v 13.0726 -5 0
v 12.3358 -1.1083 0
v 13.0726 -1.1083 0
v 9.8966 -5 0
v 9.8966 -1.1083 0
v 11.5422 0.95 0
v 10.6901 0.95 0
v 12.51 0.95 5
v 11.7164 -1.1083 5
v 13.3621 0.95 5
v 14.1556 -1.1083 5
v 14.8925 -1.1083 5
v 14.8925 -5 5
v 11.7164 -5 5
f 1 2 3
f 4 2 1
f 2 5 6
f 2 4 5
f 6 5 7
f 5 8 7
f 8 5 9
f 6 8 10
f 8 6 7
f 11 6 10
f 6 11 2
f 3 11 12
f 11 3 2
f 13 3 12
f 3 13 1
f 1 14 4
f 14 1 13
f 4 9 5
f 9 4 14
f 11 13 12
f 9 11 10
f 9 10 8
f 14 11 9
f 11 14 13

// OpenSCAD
/*
*******************************************
Objekt Info: Bibliothek für Zahnräder, 
             Schnecken und Zahnstangen

*******************************************
Version: 22.10.2026 khf
//****************************************

Enthält die Module
- zahnstange(modul, laenge, hoehe, breite, eingriffswinkel=20, schraegungswinkel=0)
- stirnrad(modul, zahnzahl, breite, bohrung, eingriffswinkel=20, schraegungswinkel=0, optimiert=true)
- pfeilrad(modul, zahnzahl, breite, bohrung, eingriffswinkel=20, schraegungswinkel=0, optimiert=true)
- zahnstange_und_rad (modul, laenge_stange, zahnzahl_rad, hoehe_stange, bohrung_rad, breite, eingriffswinkel=20, schraegungswinkel=0, zusammen_gebaut=true, optimiert=true)
- hohlrad(modul, zahnzahl, breite, randbreite, eingriffswinkel=20, schraegungswinkel=0)
- pfeilhohlrad(modul, zahnzahl, breite, randbreite, eingriffswinkel=20, schraegungswinkel=0)
- planetengetriebe(modul, zahnzahl_sonne, zahnzahl_planet, anzahl_planeten, breite, randbreite, bohrung, eingriffswinkel=20, schraegungswinkel=0, zusammen_gebaut=true, optimiert=true)
- kegelrad(modul, zahnzahl,  teilkegelwinkel, zahnbreite, bohrung, eingriffswinkel=20, schraegungswinkel=0)
- pfeilkegelrad(modul, zahnzahl, teilkegelwinkel, zahnbreite, bohrung, eingriffswinkel=20, schraegungswinkel=0)
- kegelradpaar(modul, zahnzahl_rad, zahnzahl_ritzel, achsenwinkel=90, zahnbreite, bohrung, eingriffswinkel = 20, schraegungswinkel=0, zusammen_gebaut=true)
- pfeilkegelradpaar(modul, zahnzahl_rad, zahnzsahl_ritzel, achsenwinkel=90, zahnbreite, bohrung, eingriffswinkel = 20, schraegungswinkel=0, zusammen_gebaut=true)
- schnecke(modul, gangzahl, laenge, bohrung, eingriffswinkel=20, steigungswinkel=10, zusammen_gebaut=true)
- schneckenradsatz(modul, zahnzahl, gangzahl, breite, laenge, bohrung_schnecke, bohrung_rad, eingriffswinkel=20, steigungswinkel=0, optimiert=true, zusammen_gebaut=true)


Erlaubte Module nach DIN 780:
0.05 0.06 0.08 0.10 0.12 0.16
0.20 0.25 0.3  0.4  0.5  0.6
0.7  0.8  0.9  1    1.25 1.5
2    2.5  3    4    5    6
8    10   12   16   20   25
32   40   50   60

*/
$fn = 96;

// Module:

 zahnstange(modul=1, laenge=40, hoehe=5, breite=5, eingriffswinkel=20, schraegungswinkel=20);

// stirnrad (modul=1, zahnzahl=30, breite=5, bohrung=4, eingriffswinkel=20, schraegungswinkel=20, optimiert=true);

// pfeilrad (modul=1, zahnzahl=30, breite=5, bohrung=4, eingriffswinkel=20, schraegungswinkel=30, optimiert=true);

// zahnstange_und_rad (modul=1, laenge_stange=50, zahnzahl_rad=30, hoehe_stange=4, bohrung_rad=4, breite=5, eingriffswinkel=20, schraegungswinkel=0, zusammen_gebaut=true, optimiert=true);

// hohlrad (modul=1, zahnzahl=30, breite=5, randbreite=3, eingriffswinkel=20, schraegungswinkel=20);

// pfeilhohlrad (modul=1, zahnzahl=30, breite=5, randbreite=3, eingriffswinkel=20, schraegungswinkel=30);

// planetengetriebe(modul=1, zahnzahl_sonne=16, zahnzahl_planet=9, anzahl_planeten=5, breite=5, randbreite=3, bohrung=4, eingriffswinkel=20, schraegungswinkel=30, zusammen_gebaut=true, optimiert=true);

// kegelrad(modul=1, zahnzahl=30,  teilkegelwinkel=45, zahnbreite=5, bohrung=4, eingriffswinkel=20, schraegungswinkel=20);

// pfeilkegelrad(modul=1, zahnzahl=30, teilkegelwinkel=45, zahnbreite=5, bohrung=4, eingriffswinkel=20, schraegungswinkel=30);

// kegelradpaar(modul=1, zahnzahl_rad=30, zahnzahl_ritzel=11, achsenwinkel=100, zahnbreite=5, bohrung=4, eingriffswinkel = 20, schraegungswinkel=20, zusammen_gebaut=true);

// kegelradpaar(modul=1, zahnzahl_rad=30, zahnzahl_ritzel=11, achsenwinkel=100, zahnbreite=5, bohrung_rad=3, bohrung_ritzel=3, eingriffswinkel=20, schraegungswinkel=20, zusammen_gebaut=true);

// pfeilkegelradpaar(modul=1, zahnzahl_rad=30, zahnzahl_ritzel=11, achsenwinkel=100, zahnbreite=5, bohrung_rad=3, bohrung_ritzel=3, eingriffswinkel = 20, schraegungswinkel=30, zusammen_gebaut=false);

// schnecke(modul=1, gangzahl=2, laenge=15, bohrung=4, eingriffswinkel=20, steigungswinkel=10, zusammen_gebaut=true);

// schneckenradsatz(modul=1, zahnzahl=30, gangzahl=2, breite=8, laenge=20, bohrung_schnecke=4, bohrung_rad=4, eingriffswinkel=20, steigungswinkel=10, optimiert=true, zusammen_gebaut=true);


// Allgemeine Variablen
pi = 3.14159;
rad = 57.29578;
spiel = 0.05;	// Spiel zwischen Zähnen

/*	Wandelt Radian in Grad um */
function grad(eingriffswinkel) = eingriffswinkel*rad;

/*	Wandelt Grad in Radian um */
function radian(eingriffswinkel) = eingriffswinkel/rad;

/*	Wandelt 2D-Polarkoordinaten in kartesische um
    Format: radius, phi; phi = Winkel zur x-Achse auf xy-Ebene */
function pol_zu_kart(polvect) = [
	polvect[0]*cos(polvect[1]),  
	polvect[0]*sin(polvect[1])
];

/*	Kreisevolventen-Funktion:
    Gibt die Polarkoordinaten einer Kreisevolvente aus
    r = Radius des Grundkreises
    rho = Abrollwinkel in Grad */
function ev(r,rho) = [
	r/cos(rho),
	grad(tan(rho)-radian(rho))
];

/*  Kugelevolventen-Funktion
    Gibt den Azimutwinkel einer Kugelevolvente aus
    theta0 = Polarwinkel des Kegels, an dessen Schnittkante zur Großkugel die Evolvente abrollt
    theta = Polarwinkel, für den der Azimutwinkel der Evolvente berechnet werden soll */
function kugelev(theta0,theta) = 1/sin(theta0)*acos(cos(theta)/cos(theta0))-acos(tan(theta0)/tan(theta));

/*  Wandelt Kugelkoordinaten in kartesische um
    Format: radius, theta, phi; theta = Winkel zu z-Achse, phi = Winkel zur x-Achse auf xy-Ebene */
function kugel_zu_kart(vect) = [
	vect[0]*sin(vect[1])*cos(vect[2]),  
	vect[0]*sin(vect[1])*sin(vect[2]),
	vect[0]*cos(vect[1])
];

/*	prüft, ob eine Zahl gerade ist
	= 1, wenn ja
	= 0, wenn die Zahl nicht gerade ist */
function istgerade(zahl) =
	(zahl == floor(zahl/2)*2) ? 1 : 0;

/*	größter gemeinsamer Teiler
	nach Euklidischem Algorithmus.
	Sortierung: a muss größer als b sein */
function ggt(a,b) = 
	a%b == 0 ? b : ggt(b,a%b);

/*	Polarfunktion mit polarwinkel und zwei variablen */
function spirale(a, r0, phi) =
	a*phi + r0; 

/*	Kopiert und dreht einen Körper */
module kopiere(vect, zahl, abstand, winkel){
	for(i = [0:zahl-1]){
		translate(v=vect*abstand*i)
			rotate(a=i*winkel, v = [0,0,1])
				children(0);
	}
}

/*  Zahnstange
    modul = Höhe des Zahnkopfes über der Wälzgeraden
    laenge = Länge der Zahnstange
    hoehe = Höhe der Zahnstange bis zur Wälzgeraden
    breite = Breite eines Zahns
    eingriffswinkel = Eingriffswinkel, Standardwert = 20° gemäß DIN 867. Sollte nicht größer als 45° sein.
    schraegungswinkel = Schrägungswinkel zur Zahnstangen-Querachse; 0° = Geradverzahnung */
module zahnstange(modul, laenge, hoehe, breite, eingriffswinkel = 20, schraegungswinkel = 0) {

	// Dimensions-Berechnungen
	modul=modul*(1-spiel);
	c = modul / 6;												// Kopfspiel
	mx = modul/cos(schraegungswinkel);							// Durch Schrägungswinkel verzerrtes modul in x-Richtung
	a = 2*mx*tan(eingriffswinkel)+c*tan(eingriffswinkel);		// Flankenbreite
	b = pi*mx/2-2*mx*tan(eingriffswinkel);						// Kopfbreite
	x = breite*tan(schraegungswinkel);							// Verschiebung der Oberseite in x-Richtung durch Schrägungswinkel
	nz = ceil((laenge+abs(2*x))/(pi*mx));						// Anzahl der Zähne
	
	translate([-pi*mx*(nz-1)/2-a-b/2,-modul,0]){
		intersection(){											// Erzeugt ein Prisma, das in eine Quadergeometrie eingepasst wird
			kopiere([1,0,0], nz, pi*mx, 0){
				polyhedron(
					points=[[0,-c,0], [a,2*modul,0], [a+b,2*modul,0], [2*a+b,-c,0], [pi*mx,-c,0], [pi*mx,modul-hoehe,0], [0,modul-hoehe,0],	// Unterseite
						[0+x,-c,breite], [a+x,2*modul,breite], [a+b+x,2*modul,breite], [2*a+b+x,-c,breite], [pi*mx+x,-c,breite], [pi*mx+x,modul-hoehe,breite], [0+x,modul-hoehe,breite]],	// Oberseite
					faces=[[6,5,4,3,2,1,0],						// Unterseite
						[1,8,7,0],
						[9,8,1,2],
						[10,9,2,3],
						[11,10,3,4],
						[12,11,4,5],
						[13,12,5,6],
						[7,13,6,0],
						[7,8,9,10,11,12,13],					// Oberseite
					]
				);
			};
			translate([abs(x),-hoehe+modul-0.5,-0.5]){
				cube([laenge,hoehe+modul+1,breite+1]);			// Quader, der das Volumen der Zahnstange umfasst
			}	
		};
	};	
}

/*  Stirnrad
    modul = Höhe des Zahnkopfes über dem Teilkreis
    zahnzahl = Anzahl der Radzähne
    breite = Zahnbreite
    bohrung = Durchmesser der Mittelbohrung
    eingriffswinkel = Eingriffswinkel, Standardwert = 20° gemäß DIN 867. Sollte nicht größer als 45° sein.
    schraegungswinkel = Schrägungswinkel zur Rotationsachse; 0° = Geradverzahnung
	optimiert = Löcher zur Material-/Gewichtsersparnis bzw. Oberflächenvergößerung erzeugen, wenn Geometrie erlaubt */
module stirnrad(modul, zahnzahl, breite, bohrung, eingriffswinkel = 20, schraegungswinkel = 0, optimiert = true) {

	// Dimensions-Berechnungen	
	d = modul * zahnzahl;											// Teilkreisdurchmesser
	r = d / 2;														// Teilkreisradius
	alpha_stirn = atan(tan(eingriffswinkel)/cos(schraegungswinkel));// Schrägungswinkel im Stirnschnitt
	db = d * cos(alpha_stirn);										// Grundkreisdurchmesser
	rb = db / 2;													// Grundkreisradius
	da = (modul <1)? d + modul * 2.2 : d + modul * 2;				// Kopfkreisdurchmesser nach DIN 58400 bzw. DIN 867
	ra = da / 2;													// Kopfkreisradius
	c =  (zahnzahl <3)? 0 : modul/6;								// Kopfspiel
	df = d - 2 * (modul + c);										// Fußkreisdurchmesser
	rf = df / 2;													// Fußkreisradius
	rho_ra = acos(rb/ra);											// maximaler Abrollwinkel;
																	// Evolvente beginnt auf Grundkreis und endet an Kopfkreis
	rho_r = acos(rb/r);												// Abrollwinkel am Teilkreis;
																	// Evolvente beginnt auf Grundkreis und endet an Kopfkreis
	phi_r = grad(tan(rho_r)-radian(rho_r));							// Winkel zum Punkt der Evolvente auf Teilkreis
	gamma = rad*breite/(r*tan(90-schraegungswinkel));				// Torsionswinkel für Extrusion
	schritt = rho_ra/16;											// Evolvente wird in 16 Stücke geteilt
	tau = 360/zahnzahl;												// Teilungswinkel
	
	r_loch = (2*rf - bohrung)/8;									// Radius der Löcher für Material-/Gewichtsersparnis
	rm = bohrung/2+2*r_loch;										// Abstand der Achsen der Löcher von der Hauptachse
	z_loch = floor(2*pi*rm/(3*r_loch));								// Anzahl der Löcher für Material-/Gewichtsersparnis
	
	optimiert = (optimiert && r >= breite*1.5 && d > 2*bohrung);	// ist Optimierung sinnvoll?

	// Zeichnung
	union(){
		rotate([0,0,-phi_r-90*(1-spiel)/zahnzahl]){						// Zahn auf x-Achse zentrieren;
																		// macht Ausrichtung mit anderen Rädern einfacher

			linear_extrude(height = breite, twist = gamma){
				difference(){
					union(){
						zahnbreite = (180*(1-spiel))/zahnzahl+2*phi_r;
						circle(rf);										// Fußkreis	
						for (rot = [0:tau:360]){
							rotate (rot){								// "Zahnzahl-mal" kopieren und drehen
								polygon(concat(							// Zahn
									[[0,0]],							// Zahnsegment beginnt und endet im Ursprung
									[for (rho = [0:schritt:rho_ra])		// von null Grad (Grundkreis)
																		// bis maximalen Evolventenwinkel (Kopfkreis)
										pol_zu_kart(ev(rb,rho))],		// Erste Evolventen-Flanke

									[pol_zu_kart(ev(rb,rho_ra))],		// Punkt der Evolvente auf Kopfkreis

									[for (rho = [rho_ra:-schritt:0])	// von maximalen Evolventenwinkel (Kopfkreis)
																		// bis null Grad (Grundkreis)
										pol_zu_kart([ev(rb,rho)[0], zahnbreite-ev(rb,rho)[1]])]
																		// Zweite Evolventen-Flanke
																		// (180*(1-spiel)) statt 180 Grad,
																		// um Spiel an den Flanken zu erlauben
									)
								);
							}
						}
					}			
					circle(r = rm+r_loch*1.49);							// "Bohrung"
				}
			}
		}
		// mit Materialersparnis
		if (optimiert) {
			linear_extrude(height = breite){
				difference(){
						circle(r = (bohrung+r_loch)/2);
						circle(r = bohrung/2);							// Bohrung
					}
				}
			linear_extrude(height = (breite-r_loch/2 < breite*2/3) ? breite*2/3 : breite-r_loch/2){
				difference(){
					circle(r=rm+r_loch*1.51);
					union(){
						circle(r=(bohrung+r_loch)/2);
						for (i = [0:1:z_loch]){
							translate(kugel_zu_kart([rm,90,i*360/z_loch]))
								circle(r = r_loch);
						}
					}
				}
			}
		}
		// ohne Materialersparnis
		else {
			linear_extrude(height = breite){
				difference(){
					circle(r = rm+r_loch*1.51);
					circle(r = bohrung/2);
				}
			}
		}
	}
}

/*  Pfeilrad; verwendet das Modul "stirnrad"
    modul = Höhe des Zahnkopfes über dem Teilkreis
    zahnzahl = Anzahl der Radzähne
    breite = Zahnbreite
    bohrung = Durchmesser der Mittelbohrung
    eingriffswinkel = Eingriffswinkel, Standardwert = 20° gemäß DIN 867. Sollte nicht größer als 45° sein.
    schraegungswinkel = Schrägungswinkel zur Rotationsachse, Standardwert = 0° (Geradverzahnung)
	optimiert = Löcher zur Material-/Gewichtsersparnis */
module pfeilrad(modul, zahnzahl, breite, bohrung, eingriffswinkel = 20, schraegungswinkel=0, optimiert=true){

	breite = breite/2;
	d = modul * zahnzahl;											// Teilkreisdurchmesser
	r = d / 2;														// Teilkreisradius
	c =  (zahnzahl <3)? 0 : modul/6;								// Kopfspiel

	df = d - 2 * (modul + c);										// Fußkreisdurchmesser
	rf = df / 2;													// Fußkreisradius

	r_loch = (2*rf - bohrung)/8;									// Radius der Löcher für Material-/Gewichtsersparnis
	rm = bohrung/2+2*r_loch;										// Abstand der Achsen der Löcher von der Hauptachse
	z_loch = floor(2*pi*rm/(3*r_loch));								// Anzahl der Löcher für Material-/Gewichtsersparnis
	
	optimiert = (optimiert && r >= breite*3 && d > 2*bohrung);		// ist Optimierung sinnvoll?

	translate([0,0,breite]){
		union(){
			stirnrad(modul, zahnzahl, breite, 2*(rm+r_loch*1.49), eingriffswinkel, schraegungswinkel, false);		// untere Hälfte
			mirror([0,0,1]){
				stirnrad(modul, zahnzahl, breite, 2*(rm+r_loch*1.49), eingriffswinkel, schraegungswinkel, false);	// obere Hälfte
			}
		}
	}
	// mit Materialersparnis
	if (optimiert) {
		linear_extrude(height = breite*2){
			difference(){
					circle(r = (bohrung+r_loch)/2);
					circle(r = bohrung/2);							// Bohrung
				}
			}
		linear_extrude(height = (2*breite-r_loch/2 < 1.33*breite) ? 1.33*breite : 2*breite-r_loch/2){ //breite*4/3
			difference(){
				circle(r=rm+r_loch*1.51);
				union(){
					circle(r=(bohrung+r_loch)/2);
					for (i = [0:1:z_loch]){
						translate(kugel_zu_kart([rm,90,i*360/z_loch]))
							circle(r = r_loch);
					}
				}
			}
		}
	}
	// ohne Materialersparnis
	else {
		linear_extrude(height = breite*2){
			difference(){
				circle(r = rm+r_loch*1.51);
				circle(r = bohrung/2);
			}
		}
	}
}

/*	Zahnstange und -Rad
    modul = Höhe des Zahnkopfes über dem Teilkreis
    laenge_stange = Laenge der Zahnstange
    zahnzahl_rad = Anzahl der Radzähne
	hoehe_stange = Höhe der Zahnstange bis zur Wälzgeraden
    bohrung_rad = Durchmesser der Mittelbohrung des Stirnrads
	breite = Breite eines Zahns
    eingriffswinkel = Eingriffswinkel, Standardwert = 20° gemäß DIN 867. Sollte nicht größer als 45° sein.
    schraegungswinkel = Schrägungswinkel zur Rotationsachse, Standardwert = 0° (Geradverzahnung) */
module zahnstange_und_rad (modul, laenge_stange, zahnzahl_rad, hoehe_stange, bohrung_rad, breite, eingriffswinkel=20, schraegungswinkel=0, zusammen_gebaut=true, optimiert=true) {

	abstand = zusammen_gebaut? modul*zahnzahl_rad/2 : modul*zahnzahl_rad;

	zahnstange(modul, laenge_stange, hoehe_stange, breite, eingriffswinkel, -schraegungswinkel);
	translate([0,abstand,0])
		rotate(a=360/zahnzahl_rad)
			stirnrad (modul, zahnzahl_rad, breite, bohrung_rad, eingriffswinkel, schraegungswinkel, optimiert);
}

/*	Hohlrad
    modul = Höhe des Zahnkopfes über dem Teilkreis
    zahnzahl = Anzahl der Radzähne
    breite = Zahnbreite
	randbreite = Breite des Randes ab Fußkreis
    bohrung = Durchmesser der Mittelbohrung
    eingriffswinkel = Eingriffswinkel, Standardwert = 20° gemäß DIN 867. Sollte nicht größer als 45° sein.
    schraegungswinkel = Schrägungswinkel zur Rotationsachse, Standardwert = 0° (Geradverzahnung) */
module hohlrad(modul, zahnzahl, breite, randbreite, eingriffswinkel = 20, schraegungswinkel = 0) {

	// Dimensions-Berechnungen	
	ha = (zahnzahl >= 20) ? 0.02 * atan((zahnzahl/15)/pi) : 0.6;	// Verkürzungsfaktor Zahnkopfhöhe
	d = modul * zahnzahl;											// Teilkreisdurchmesser
	r = d / 2;														// Teilkreisradius
	alpha_stirn = atan(tan(eingriffswinkel)/cos(schraegungswinkel));// Schrägungswinkel im Stirnschnitt
	db = d * cos(alpha_stirn);										// Grundkreisdurchmesser
	rb = db / 2;													// Grundkreisradius
	c = modul / 6;													// Kopfspiel
	da = (modul <1)? d + (modul+c) * 2.2 : d + (modul+c) * 2;		// Kopfkreisdurchmesser
	ra = da / 2;													// Kopfkreisradius
	df = d - 2 * modul * ha;										// Fußkreisdurchmesser
	rf = df / 2;													// Fußkreisradius
	rho_ra = acos(rb/ra);											// maximaler Evolventenwinkel;
																	// Evolvente beginnt auf Grundkreis und endet an Kopfkreis
	rho_r = acos(rb/r);												// Evolventenwinkel am Teilkreis;
																	// Evolvente beginnt auf Grundkreis und endet an Kopfkreis
	phi_r = grad(tan(rho_r)-radian(rho_r));							// Winkel zum Punkt der Evolvente auf Teilkreis
	gamma = rad*breite/(r*tan(90-schraegungswinkel));				// Torsionswinkel für Extrusion
	schritt = rho_ra/16;											// Evolvente wird in 16 Stücke geteilt
	tau = 360/zahnzahl;												// Teilungswinkel

	// Zeichnung
	rotate([0,0,-phi_r-90*(1+spiel)/zahnzahl])						// Zahn auf x-Achse zentrieren;
																	// macht Ausrichtung mit anderen Rädern einfacher
	linear_extrude(height = breite, twist = gamma){
		difference(){
			circle(r = ra + randbreite);							// Außenkreis
			union(){
				zahnbreite = (180*(1+spiel))/zahnzahl+2*phi_r;
				circle(rf);											// Fußkreis	
				for (rot = [0:tau:360]){
					rotate (rot) {									// "Zahnzahl-mal" kopieren und drehen
						polygon( concat(
							[[0,0]],
							[for (rho = [0:schritt:rho_ra])			// von null Grad (Grundkreis)
																	// bis maximaler Evolventenwinkel (Kopfkreis)
								pol_zu_kart(ev(rb,rho))],
							[pol_zu_kart(ev(rb,rho_ra))],
							[for (rho = [rho_ra:-schritt:0])		// von maximaler Evolventenwinkel (Kopfkreis)
																	// bis null Grad (Grundkreis)
								pol_zu_kart([ev(rb,rho)[0], zahnbreite-ev(rb,rho)[1]])]
																	// (180*(1+spiel)) statt 180,
																	// um Spiel an den Flanken zu erlauben
							)
						);
					}
				}
			}
		}
	}

	echo("Außendurchmesser Hohlrad = ", 2*(ra + randbreite));
	
}

/*  Pfeil-Hohlrad; verwendet das Modul "hohlrad"
    modul = Höhe des Zahnkopfes über dem Teilkegel
    zahnzahl = Anzahl der Radzähne
    breite = Zahnbreite
    bohrung = Durchmesser der Mittelbohrung
    eingriffswinkel = Eingriffswinkel, Standardwert = 20° gemäß DIN 867. Sollte nicht größer als 45° sein.
    schraegungswinkel = Schrägungswinkel zur Rotationsachse, Standardwert = 0° (Geradverzahnung) */
module pfeilhohlrad(modul, zahnzahl, breite, randbreite, eingriffswinkel = 20, schraegungswinkel = 0) {

	breite = breite / 2;
	translate([0,0,breite])
		union(){
		hohlrad(modul, zahnzahl, breite, randbreite, eingriffswinkel, schraegungswinkel);		// untere Hälfte
		mirror([0,0,1])
			hohlrad(modul, zahnzahl, breite, randbreite, eingriffswinkel, schraegungswinkel);	// obere Hälfte
	}
}

/*	Planetengetriebe; verwendet die Module "pfeilrad" und "pfeilhohlrad"
    modul = Höhe des Zahnkopfes über dem Teilkegel
    zahnzahl_sonne = Anzahl der Zähne des Sonnenrads
    zahnzahl_planet = Anzahl der Zähne eines Planetenrads
    anzahl_planeten = Anzahl der Planetenräder. Wenn null, rechnet die Funktion die Mindestanzahl aus.
    breite = Zahnbreite
	randbreite = Breite des Randes ab Fußkreis
    bohrung = Durchmesser der Mittelbohrung
    eingriffswinkel = Eingriffswinkel, Standardwert = 20° gemäß DIN 867. Sollte nicht größer als 45° sein.
    schraegungswinkel = Schrägungswinkel zur Rotationsachse, Standardwert = 0° (Geradverzahnung)
	zusammen_gebaut = 
	optimiert = Löcher zur Material-/Gewichtsersparnis bzw. Oberflächenvergößerung erzeugen, wenn Geometrie erlaubt
	zusammen_gebaut = Komponenten zusammengebaut für Konstruktion oder auseinander zum 3D-Druck	*/
module planetengetriebe(modul, zahnzahl_sonne, zahnzahl_planet, anzahl_planeten, breite, randbreite, bohrung, eingriffswinkel=20, schraegungswinkel=0, zusammen_gebaut=true, optimiert=true){

	// Dimensions-Berechnungen
	d_sonne = modul*zahnzahl_sonne;										// Teilkreisdurchmesser Sonne
	d_planet = modul*zahnzahl_planet;									// Teilkreisdurchmesser Planeten
	achsabstand = modul*(zahnzahl_sonne +  zahnzahl_planet) / 2;		// Abstand von Sonnenrad-/Hohlradachse und Planetenachse
	zahnzahl_hohlrad = zahnzahl_sonne + 2*zahnzahl_planet;				// Anzahl der Zähne des Hohlrades
    d_hohlrad = modul*zahnzahl_hohlrad;									// Teilkreisdurchmesser Hohlrad

	drehen = istgerade(zahnzahl_planet);								// Muss das Sonnenrad gedreht werden?
		
	n_max = floor(180/asin(modul*(zahnzahl_planet)/(modul*(zahnzahl_sonne +  zahnzahl_planet))));
																		// Anzahl Planetenräder: höchstens so viele, wie ohne
																		// Überlappung möglich

	// Zeichnung
	rotate([0,0,180/zahnzahl_sonne*drehen]){
		pfeilrad (modul, zahnzahl_sonne, breite, bohrung, eingriffswinkel, -schraegungswinkel, optimiert);		// Sonnenrad
	}

	if (zusammen_gebaut){
        if(anzahl_planeten==0){
            list = [ for (n=[2 : 1 : n_max]) if ((((zahnzahl_hohlrad+zahnzahl_sonne)/n)==floor((zahnzahl_hohlrad+zahnzahl_sonne)/n))) n];
            anzahl_planeten = list[0];										// Ermittele Anzahl Planetenräder
             achsabstand = modul*(zahnzahl_sonne + zahnzahl_planet)/2;		// Abstand von Sonnenrad-/Hohlradachse
            for(n=[0:1:anzahl_planeten-1]){
                translate(kugel_zu_kart([achsabstand,90,360/anzahl_planeten*n]))
					rotate([0,0,n*360*d_sonne/d_planet])
						pfeilrad (modul, zahnzahl_planet, breite, bohrung, eingriffswinkel, schraegungswinkel);	// Planetenräder
            }
       }
       else{
            achsabstand = modul*(zahnzahl_sonne + zahnzahl_planet)/2;		// Abstand von Sonnenrad-/Hohlradachse
            for(n=[0:1:anzahl_planeten-1]){
                translate(kugel_zu_kart([achsabstand,90,360/anzahl_planeten*n]))
                rotate([0,0,n*360*d_sonne/(d_planet)])
                    pfeilrad (modul, zahnzahl_planet, breite, bohrung, eingriffswinkel, schraegungswinkel);	// Planetenräder
            }
		}
	}
	else{
		planetenabstand = zahnzahl_hohlrad*modul/2+randbreite+d_planet;		// Abstand Planeten untereinander
		for(i=[-(anzahl_planeten-1):2:(anzahl_planeten-1)]){
			translate([planetenabstand, d_planet*i,0])
				pfeilrad (modul, zahnzahl_planet, breite, bohrung, eingriffswinkel, schraegungswinkel);	// Planetenräder
		}
	}

	pfeilhohlrad (modul, zahnzahl_hohlrad, breite, randbreite, eingriffswinkel, schraegungswinkel); // Hohlrad

}

/*  Kegelrad
    modul = Höhe des Zahnkopfes über dem Teilkegel; Angabe für die Aussenseite des Kegels
    zahnzahl = Anzahl der Radzähne
    teilkegelwinkel = (Halb)winkel des Kegels, auf dem das jeweils andere Hohlrad abrollt
    zahnbreite = Breite der Zähne von der Außenseite in Richtung Kegelspitze
    bohrung = Durchmesser der Mittelbohrung
    eingriffswinkel = Eingriffswinkel, Standardwert = 20° gemäß DIN 867. Sollte nicht größer als 45° sein.
	schraegungswinkel = Schrägungswinkel, Standardwert = 0° */
module kegelrad(modul, zahnzahl, teilkegelwinkel, zahnbreite, bohrung, eingriffswinkel = 20, schraegungswinkel=0) {

	// Dimensions-Berechnungen
	d_aussen = modul * zahnzahl;									// Teilkegeldurchmesser auf der Kegelgrundfläche,
																	// entspricht der Sehne im Kugelschnitt
	r_aussen = d_aussen / 2;										// Teilkegelradius auf der Kegelgrundfläche 
	rg_aussen = r_aussen/sin(teilkegelwinkel);						// Großkegelradius für Zahn-Außenseite, entspricht der Länge der Kegelflanke;
	rg_innen = rg_aussen - zahnbreite;								// Großkegelradius für Zahn-Innenseite	
	r_innen = r_aussen*rg_innen/rg_aussen;
	alpha_stirn = atan(tan(eingriffswinkel)/cos(schraegungswinkel));// Schrägungswinkel im Stirnschnitt
	delta_b = asin(cos(alpha_stirn)*sin(teilkegelwinkel));			// Grundkegelwinkel		
	da_aussen = (modul <1)? d_aussen + (modul * 2.2) * cos(teilkegelwinkel): d_aussen + modul * 2 * cos(teilkegelwinkel);
	ra_aussen = da_aussen / 2;
	delta_a = asin(ra_aussen/rg_aussen);
	c = modul / 6;													// Kopfspiel
	df_aussen = d_aussen - (modul +c) * 2 * cos(teilkegelwinkel);
	rf_aussen = df_aussen / 2;
	delta_f = asin(rf_aussen/rg_aussen);
	rkf = rg_aussen*sin(delta_f);									// Radius des Kegelfußes
	hoehe_f = rg_aussen*cos(delta_f);								// Höhe des Kegels vom Fußkegel
	
	echo("Teilkegeldurchmesser auf der Kegelgrundfläche = ", d_aussen);
	
	// Größen für Komplementär-Kegelstumpf
	hoehe_k = (rg_aussen-zahnbreite)/cos(teilkegelwinkel);			// Höhe des Komplementärkegels für richtige Zahnlänge
	rk = (rg_aussen-zahnbreite)/sin(teilkegelwinkel);				// Fußradius des Komplementärkegels
	rfk = rk*hoehe_k*tan(delta_f)/(rk+hoehe_k*tan(delta_f));		// Kopfradius des Zylinders für 
																	// Komplementär-Kegelstumpf
	hoehe_fk = rk*hoehe_k/(hoehe_k*tan(delta_f)+rk);				// Hoehe des Komplementär-Kegelstumpfs

	echo("Höhe Kegelrad = ", hoehe_f-hoehe_fk);
	
	phi_r = kugelev(delta_b, teilkegelwinkel);						// Winkel zum Punkt der Evolvente auf Teilkegel
		
	// Torsionswinkel gamma aus Schrägungswinkel
	gamma_g = 2*atan(zahnbreite*tan(schraegungswinkel)/(2*rg_aussen-zahnbreite));
	gamma = 2*asin(rg_aussen/r_aussen*sin(gamma_g/2));
	
	schritt = (delta_a - delta_b)/16;
	tau = 360/zahnzahl;												// Teilungswinkel
	start = (delta_b > delta_f) ? delta_b : delta_f;
	spiegelpunkt = (180*(1-spiel))/zahnzahl+2*phi_r;

	// Zeichnung
	rotate([0,0,phi_r+90*(1-spiel)/zahnzahl]){						// Zahn auf x-Achse zentrieren;
																	// macht Ausrichtung mit anderen Rädern einfacher
		translate([0,0,hoehe_f]) rotate(a=[0,180,0]){
			union(){
				translate([0,0,hoehe_f]) rotate(a=[0,180,0]){								// Kegelstumpf							
					difference(){
						linear_extrude(height=hoehe_f-hoehe_fk, scale=rfk/rkf) circle(rkf*1.001); // 1 promille Überlappung mit Zahnfuß
						translate([0,0,-1]){
							cylinder(h = hoehe_f-hoehe_fk+2, r = bohrung/2);				// Bohrung
						}
					}	
				}
				for (rot = [0:tau:360]){
					rotate (rot) {															// "Zahnzahl-mal" kopieren und drehen
						union(){
							if (delta_b > delta_f){
								// Zahnfuß
								flankenpunkt_unten = 1*spiegelpunkt;
								flankenpunkt_oben = kugelev(delta_f, start);
								polyhedron(
									points = [
										kugel_zu_kart([rg_aussen, start*1.001, flankenpunkt_unten]),	// 1 promille Überlappung mit Zahn
										kugel_zu_kart([rg_innen, start*1.001, flankenpunkt_unten+gamma]),
										kugel_zu_kart([rg_innen, start*1.001, spiegelpunkt-flankenpunkt_unten+gamma]),
										kugel_zu_kart([rg_aussen, start*1.001, spiegelpunkt-flankenpunkt_unten]),								
										kugel_zu_kart([rg_aussen, delta_f, flankenpunkt_unten]),
										kugel_zu_kart([rg_innen, delta_f, flankenpunkt_unten+gamma]),
										kugel_zu_kart([rg_innen, delta_f, spiegelpunkt-flankenpunkt_unten+gamma]),
										kugel_zu_kart([rg_aussen, delta_f, spiegelpunkt-flankenpunkt_unten])								
									],
									faces = [[0,1,2],[0,2,3],[0,4,1],[1,4,5],[1,5,2],[2,5,6],[2,6,3],[3,6,7],[0,3,7],[0,7,4],[4,6,5],[4,7,6]],
									convexity =1
								);
							}
							// Zahn
							for (delta = [start:schritt:delta_a-schritt]){
								flankenpunkt_unten = kugelev(delta_b, delta);
								flankenpunkt_oben = kugelev(delta_b, delta+schritt);
								polyhedron(
									points = [
										kugel_zu_kart([rg_aussen, delta, flankenpunkt_unten]),
										kugel_zu_kart([rg_innen, delta, flankenpunkt_unten+gamma]),
										kugel_zu_kart([rg_innen, delta, spiegelpunkt-flankenpunkt_unten+gamma]),
										kugel_zu_kart([rg_aussen, delta, spiegelpunkt-flankenpunkt_unten]),								
										kugel_zu_kart([rg_aussen, delta+schritt, flankenpunkt_oben]),
										kugel_zu_kart([rg_innen, delta+schritt, flankenpunkt_oben+gamma]),
										kugel_zu_kart([rg_innen, delta+schritt, spiegelpunkt-flankenpunkt_oben+gamma]),
										kugel_zu_kart([rg_aussen, delta+schritt, spiegelpunkt-flankenpunkt_oben])									
									],
									faces = [[0,1,2],[0,2,3],[0,4,1],[1,4,5],[1,5,2],[2,5,6],[2,6,3],[3,6,7],[0,3,7],[0,7,4],[4,6,5],[4,7,6]],
									convexity =1
								);
							}
						}
					}
				}	
			}
		}
	}
}

/*  Pfeil-Kegelrad; verwendet das Modul "kegelrad"
    modul = Höhe des Zahnkopfes über dem Teilkreis
    zahnzahl = Anzahl der Radzähne
    teilkegelwinkel, zahnbreite
    bohrung = Durchmesser der Mittelbohrung
    eingriffswinkel = Eingriffswinkel, Standardwert = 20° gemäß DIN 867. Sollte nicht größer als 45° sein.
    schraegungswinkel = Schrägungswinkel, Standardwert = 0° */
module pfeilkegelrad(modul, zahnzahl, teilkegelwinkel, zahnbreite, bohrung, eingriffswinkel = 20, schraegungswinkel=0){

	// Dimensions-Berechnungen
	
	zahnbreite = zahnbreite / 2;
	
	d_aussen = modul * zahnzahl;								// Teilkegeldurchmesser auf der Kegelgrundfläche,
																// entspricht der Sehne im Kugelschnitt
	r_aussen = d_aussen / 2;									// Teilkegelradius auf der Kegelgrundfläche 
	rg_aussen = r_aussen/sin(teilkegelwinkel);					// Großkegelradius, entspricht der Länge der Kegelflanke;
	c = modul / 6;												// Kopfspiel
	df_aussen = d_aussen - (modul +c) * 2 * cos(teilkegelwinkel);
	rf_aussen = df_aussen / 2;
	delta_f = asin(rf_aussen/rg_aussen);
	hoehe_f = rg_aussen*cos(delta_f);							// Höhe des Kegels vom Fußkegel

	// Torsionswinkel gamma aus Schrägungswinkel
	gamma_g = 2*atan(zahnbreite*tan(schraegungswinkel)/(2*rg_aussen-zahnbreite));
	gamma = 2*asin(rg_aussen/r_aussen*sin(gamma_g/2));
	
	echo("Teilkegeldurchmesser auf der Kegelgrundfläche = ", d_aussen);
	
	// Größen für Komplementär-Kegelstumpf
	hoehe_k = (rg_aussen-zahnbreite)/cos(teilkegelwinkel);		// Höhe des Komplementärkegels für richtige Zahnlänge
	rk = (rg_aussen-zahnbreite)/sin(teilkegelwinkel);			// Fußradius des Komplementärkegels
	rfk = rk*hoehe_k*tan(delta_f)/(rk+hoehe_k*tan(delta_f));	// Kopfradius des Zylinders für 
																// Komplementär-Kegelstumpf
	hoehe_fk = rk*hoehe_k/(hoehe_k*tan(delta_f)+rk);			// Hoehe des Komplementär-Kegelstumpfs
	
	modul_innen = modul*(1-zahnbreite/rg_aussen);

		union(){
		kegelrad(modul, zahnzahl, teilkegelwinkel, zahnbreite, bohrung, eingriffswinkel, schraegungswinkel);		// untere Hälfte
		translate([0,0,hoehe_f-hoehe_fk])
			rotate(a=-gamma,v=[0,0,1])
				kegelrad(modul_innen, zahnzahl, teilkegelwinkel, zahnbreite, bohrung, eingriffswinkel, -schraegungswinkel);	// obere Hälfte
	}
}

/*  Spiral-Kegelrad; verwendet das Modul "kegelrad"
    modul = Höhe des Zahnkopfes über dem Teilkreis
    zahnzahl = Anzahl der Radzähne
    hoehe = Höhe des Zahnrads
    bohrung = Durchmesser der Mittelbohrung
    eingriffswinkel = Eingriffswinkel, Standardwert = 20° gemäß DIN 867. Sollte nicht größer als 45° sein.
    schraegungswinkel = Schrägungswinkel, Standardwert = 0° */
module spiralkegelrad(modul, zahnzahl, teilkegelwinkel, zahnbreite, bohrung, eingriffswinkel = 20, schraegungswinkel=30){

	schritte = 16;

	// Dimensions-Berechnungen
	
	b = zahnbreite / schritte;	
	d_aussen = modul * zahnzahl;								// Teilkegeldurchmesser auf der Kegelgrundfläche,
																// entspricht der Sehne im Kugelschnitt
	r_aussen = d_aussen / 2;									// Teilkegelradius auf der Kegelgrundfläche 
	rg_aussen = r_aussen/sin(teilkegelwinkel);					// Großkegelradius, entspricht der Länge der Kegelflanke;
	rg_mitte = rg_aussen-zahnbreite/2;

	echo("Teilkegeldurchmesser auf der Kegelgrundfläche = ", d_aussen);

	a=tan(schraegungswinkel)/rg_mitte;
	
	union(){
	for(i=[0:1:schritte-1]){
		r = rg_aussen-i*b;
		schraegungswinkel = a*r;
		modul_r = modul-b*i/rg_aussen;
		translate([0,0,b*cos(teilkegelwinkel)*i])
			
			rotate(a=-schraegungswinkel*i,v=[0,0,1])
				kegelrad(modul_r, zahnzahl, teilkegelwinkel, b, bohrung, eingriffswinkel, schraegungswinkel);	// obere Hälfte
		}
	}
}

/*	Kegelradpaar mit beliebigem Achsenwinkel; verwendet das Modul "kegelrad"
    modul = Höhe des Zahnkopfes über dem Teilkegel; Angabe für die Aussenseite des Kegels
    zahnzahl_rad = Anzahl der Radzähne am Rad
    zahnzahl_ritzel = Anzahl der Radzähne am Ritzel
	achsenwinkel = Winkel zwischen den Achsen von Rad und Ritzel
    zahnbreite = Breite der Zähne von der Außenseite in Richtung Kegelspitze
    bohrung_rad = Durchmesser der Mittelbohrung des Rads
    bohrung_ritzel = Durchmesser der Mittelbohrungen des Ritzels
    eingriffswinkel = Eingriffswinkel, Standardwert = 20° gemäß DIN 867. Sollte nicht größer als 45° sein.
	schraegungswinkel = Schrägungswinkel, Standardwert = 0°
	zusammen_gebaut = Komponenten zusammengebaut für Konstruktion oder auseinander zum 3D-Druck */
module kegelradpaar(modul, zahnzahl_rad, zahnzahl_ritzel, achsenwinkel=90, zahnbreite, bohrung_rad, bohrung_ritzel, eingriffswinkel=20, schraegungswinkel=0, zusammen_gebaut=true){
 
	// Dimensions-Berechnungen
	r_rad = modul*zahnzahl_rad/2;							// Teilkegelradius des Rads
	delta_rad = atan(sin(achsenwinkel)/(zahnzahl_ritzel/zahnzahl_rad+cos(achsenwinkel)));	// Kegelwinkel des Rads
	delta_ritzel = atan(sin(achsenwinkel)/(zahnzahl_rad/zahnzahl_ritzel+cos(achsenwinkel)));// Kegelwingel des Ritzels
	rg = r_rad/sin(delta_rad);								// Radius der Großkugel
	c = modul / 6;											// Kopfspiel
	df_ritzel = pi*rg*delta_ritzel/90 - 2 * (modul + c);	// Fußkegeldurchmesser auf der Großkugel 
	rf_ritzel = df_ritzel / 2;								// Fußkegelradius auf der Großkugel
	delta_f_ritzel = rf_ritzel/(pi*rg) * 180;				// Kopfkegelwinkel
	rkf_ritzel = rg*sin(delta_f_ritzel);					// Radius des Kegelfußes
	hoehe_f_ritzel = rg*cos(delta_f_ritzel);				// Höhe des Kegels vom Fußkegel
	
	echo("Kegelwinkel Rad = ", delta_rad);
	echo("Kegelwinkel Ritzel = ", delta_ritzel);
 
	df_rad = pi*rg*delta_rad/90 - 2 * (modul + c);			// Fußkegeldurchmesser auf der Großkugel 
	rf_rad = df_rad / 2;									// Fußkegelradius auf der Großkugel
	delta_f_rad = rf_rad/(pi*rg) * 180;						// Kopfkegelwinkel
	rkf_rad = rg*sin(delta_f_rad);							// Radius des Kegelfußes
	hoehe_f_rad = rg*cos(delta_f_rad);						// Höhe des Kegels vom Fußkegel

	echo("Höhe Rad = ", hoehe_f_rad);
	echo("Höhe Ritzel = ", hoehe_f_ritzel);
	
	drehen = istgerade(zahnzahl_ritzel);
	
	// Zeichnung
	// Rad
	rotate([0,0,180*(1-spiel)/zahnzahl_rad*drehen])
		kegelrad(modul, zahnzahl_rad, delta_rad, zahnbreite, bohrung_rad, eingriffswinkel, schraegungswinkel);
	
	// Ritzel
	if (zusammen_gebaut)
		translate([-hoehe_f_ritzel*cos(90-achsenwinkel),0,hoehe_f_rad-hoehe_f_ritzel*sin(90-achsenwinkel)])
			rotate([0,achsenwinkel,0])
				kegelrad(modul, zahnzahl_ritzel, delta_ritzel, zahnbreite, bohrung_ritzel, eingriffswinkel, -schraegungswinkel);
	else
		translate([rkf_ritzel*2+modul+rkf_rad,0,0])
			kegelrad(modul, zahnzahl_ritzel, delta_ritzel, zahnbreite, bohrung_ritzel, eingriffswinkel, -schraegungswinkel);
 }

/*	Pfeil-Kegelradpaar mit beliebigem Achsenwinkel; verwendet das Modul "pfeilkegelrad"
    modul = Höhe des Zahnkopfes über dem Teilkegel; Angabe für die Aussenseite des Kegels
    zahnzahl_rad = Anzahl der Radzähne am Rad
    zahnzahl_ritzel = Anzahl der Radzähne am Ritzel
	achsenwinkel = Winkel zwischen den Achsen von Rad und Ritzel
    zahnbreite = Breite der Zähne von der Außenseite in Richtung Kegelspitze
    bohrung_rad = Durchmesser der Mittelbohrung des Rads
    bohrung_ritzel = Durchmesser der Mittelbohrungen des Ritzels
    eingriffswinkel = Eingriffswinkel, Standardwert = 20° gemäß DIN 867. Sollte nicht größer als 45° sein.
    schraegungswinkel = Schrägungswinkel, Standardwert = 0°
	zusammen_gebaut = Komponenten zusammengebaut für Konstruktion oder auseinander zum 3D-Druck */
module pfeilkegelradpaar(modul, zahnzahl_rad, zahnzahl_ritzel, achsenwinkel=90, zahnbreite, bohrung_rad, bohrung_ritzel, eingriffswinkel = 20, schraegungswinkel=10, zusammen_gebaut=true){
 
	r_rad = modul*zahnzahl_rad/2;							// Teilkegelradius des Rads
	delta_rad = atan(sin(achsenwinkel)/(zahnzahl_ritzel/zahnzahl_rad+cos(achsenwinkel)));	// Kegelwinkel des Rads
	delta_ritzel = atan(sin(achsenwinkel)/(zahnzahl_rad/zahnzahl_ritzel+cos(achsenwinkel)));// Kegelwingel des Ritzels
	rg = r_rad/sin(delta_rad);								// Radius der Großkugel
	c = modul / 6;											// Kopfspiel
	df_ritzel = pi*rg*delta_ritzel/90 - 2 * (modul + c);	// Fußkegeldurchmesser auf der Großkugel 
	rf_ritzel = df_ritzel / 2;								// Fußkegelradius auf der Großkugel
	delta_f_ritzel = rf_ritzel/(pi*rg) * 180;				// Kopfkegelwinkel
	rkf_ritzel = rg*sin(delta_f_ritzel);					// Radius des Kegelfußes
	hoehe_f_ritzel = rg*cos(delta_f_ritzel);				// Höhe des Kegels vom Fußkegel
	
	echo("Kegelwinkel Rad = ", delta_rad);
	echo("Kegelwinkel Ritzel = ", delta_ritzel);
 
	df_rad = pi*rg*delta_rad/90 - 2 * (modul + c);			// Fußkegeldurchmesser auf der Großkugel 
	rf_rad = df_rad / 2;									// Fußkegelradius auf der Großkugel
	delta_f_rad = rf_rad/(pi*rg) * 180;						// Kopfkegelwinkel
	rkf_rad = rg*sin(delta_f_rad);							// Radius des Kegelfußes
	hoehe_f_rad = rg*cos(delta_f_rad);						// Höhe des Kegels vom Fußkegel

	echo("Höhe Rad = ", hoehe_f_rad);
	echo("Höhe Ritzel = ", hoehe_f_ritzel);
	
	drehen = istgerade(zahnzahl_ritzel);
	
	// Rad
	rotate([0,0,180*(1-spiel)/zahnzahl_rad*drehen])
		pfeilkegelrad(modul, zahnzahl_rad, delta_rad, zahnbreite, bohrung_rad, eingriffswinkel, schraegungswinkel);
	
	// Ritzel
	if (zusammen_gebaut)
		translate([-hoehe_f_ritzel*cos(90-achsenwinkel),0,hoehe_f_rad-hoehe_f_ritzel*sin(90-achsenwinkel)])
			rotate([0,achsenwinkel,0])
				pfeilkegelrad(modul, zahnzahl_ritzel, delta_ritzel, zahnbreite, bohrung_ritzel, eingriffswinkel, -schraegungswinkel);
	else
		translate([rkf_ritzel*2+modul+rkf_rad,0,0])
			pfeilkegelrad(modul, zahnzahl_ritzel, delta_ritzel, zahnbreite, bohrung_ritzel, eingriffswinkel, -schraegungswinkel);

}

/*
Berechnet eine Schnecke / archimedische Schraube.
modul = Höhe des Schneckenkopfes über dem Teilzylinder
gangzahl = Anzahl der Gänge (Zähne) der Schnecke
laenge = Länge der Schnecke
bohrung = Durchmesser der Mittelbohrung
eingriffswinkel = Eingriffswinkel, Standardwert = 20° gemäß DIN 867. Sollte nicht größer als 45° sein.
steigungswinkel = Steigungswinkel der Schnecke, entspricht 90° minus Schrägungswinkel. Positiver Steigungswinkel = rechtsdrehend.
zusammen_gebaut = Komponenten zusammengebaut für Konstruktion oder auseinander zum 3D-Druck */
module schnecke(modul, gangzahl, laenge, bohrung, eingriffswinkel=20, steigungswinkel, zusammen_gebaut=true){

	// Dimensions-Berechnungen
	c = modul / 6;												// Kopfspiel
	r = modul*gangzahl/(2*sin(steigungswinkel));				// Teilzylinder-Radius
	rf = r - modul - c;											// Fußzylinder-Radius
	a = modul*gangzahl/(90*tan(eingriffswinkel));				// Spiralparameter
	tau_max = 180/gangzahl*tan(eingriffswinkel);				// Winkel von Fuß zu Kopf in der Normalen
	gamma = -rad*laenge/((rf+modul+c)*tan(steigungswinkel));	// Torsionswinkel für Extrusion
	
	schritt = tau_max/16;
	
	// Zeichnung: extrudiere mit Verwindung eine Flaeche, die von zwei archimedischen Spiralen eingeschlossen wird
	if (zusammen_gebaut) {
		rotate([0,0,tau_max]){
			linear_extrude(height = laenge, center = false, convexity = 10, twist = gamma){
				difference(){
					union(){
						for(i=[0:1:gangzahl-1]){
							polygon(
								concat(							
									[[0,0]],
									
									// ansteigende Zahnflanke
									[for (tau = [0:schritt:tau_max])
										pol_zu_kart([spirale(a, rf, tau), tau+i*(360/gangzahl)])],
										
									// Zahnkopf
									[for (tau = [tau_max:schritt:180/gangzahl])
										pol_zu_kart([spirale(a, rf, tau_max), tau+i*(360/gangzahl)])],
									
									// absteigende Zahnflanke
									[for (tau = [180/gangzahl:schritt:(180/gangzahl+tau_max)])
										pol_zu_kart([spirale(a, rf, 180/gangzahl+tau_max-tau), tau+i*(360/gangzahl)])]
								)
							);
						}
						circle(rf);
					}
					circle(bohrung/2); // Mittelbohrung
				}
			}
		}
	}
	else {
		difference(){
			union(){
				translate([1,r*1.5,0]){
					rotate([90,0,90])
						schnecke(modul, gangzahl, laenge, bohrung, eingriffswinkel, steigungswinkel, zusammen_gebaut=true);
				}
				translate([laenge+1,-r*1.5,0]){
					rotate([90,0,-90])
						schnecke(modul, gangzahl, laenge, bohrung, eingriffswinkel, steigungswinkel, zusammen_gebaut=true);
					}
				}
			translate([laenge/2+1,0,-(r+modul+1)/2]){
					cube([laenge+2,3*r+2*(r+modul+1),r+modul+1], center = true);
				}
		}
	}
}

/*
Berechnet einen Schneckenradsatz. Das Schneckenrad ist ein gewöhnliches Stirnrad ohne Globoidgeometrie.
modul = Höhe des Schneckenkopfes über dem Teilzylinder bzw. des Zahnkopfes über dem Teilkreis
zahnzahl = Anzahl der Radzähne
gangzahl = Anzahl der Gänge (Zähne) der Schnecke
breite = Zahnbreite
laenge = Länge der Schnecke
bohrung_schnecke = Durchmesser der Mittelbohrung der Schnecke
bohrung_rad = Durchmesser der Mittelbohrung des Stirnrads
eingriffswinkel = Eingriffswinkel, Standardwert = 20° gemäß DIN 867. Sollte nicht größer als 45° sein.
steigungswinkel = Steigungswinkel der Schnecke, entspricht 90°-Schrägungswinkel. Positiver Steigungswinkel = rechtsdrehend.
optimiert = Löcher zur Material-/Gewichtsersparnis
zusammen_gebaut =  Komponenten zusammengebaut für Konstruktion oder auseinander zum 3D-Druck */
module schneckenradsatz(modul, zahnzahl, gangzahl, breite, laenge, bohrung_schnecke, bohrung_rad, eingriffswinkel=20, steigungswinkel, optimiert=true, zusammen_gebaut=true){
	
	c = modul / 6;												// Kopfspiel
	r_schnecke = modul*gangzahl/(2*sin(steigungswinkel));		// Teilzylinder-Radius Schnecke
	r_rad = modul*zahnzahl/2;									// Teilkegelradius Stirnrad
	rf_schnecke = r_schnecke - modul - c;						// Fußzylinder-Radius
	gamma = -90*breite*sin(steigungswinkel)/(pi*r_rad);			// Rotationswinkel Stirnrad
	zahnabstand = modul*pi/cos(steigungswinkel);				// Zahnabstand im Transversalschnitt
	x = istgerade(gangzahl)? 0.5 : 1;

	if (zusammen_gebaut) {
		translate([r_schnecke,(ceil(laenge/(2*zahnabstand))-x)*zahnabstand,0])
			rotate([90,180/gangzahl,0])
				schnecke(modul, gangzahl, laenge, bohrung_schnecke, eingriffswinkel, steigungswinkel, zusammen_gebaut);

		translate([-r_rad,0,-breite/2])
			rotate([0,0,gamma])
				stirnrad (modul, zahnzahl, breite, bohrung_rad, eingriffswinkel, -steigungswinkel, optimiert);
	}
	else {	
		schnecke(modul, gangzahl, laenge, bohrung_schnecke, eingriffswinkel, steigungswinkel, zusammen_gebaut);

		translate([-2*r_rad,0,0])
			stirnrad (modul, zahnzahl, breite, bohrung_rad, eingriffswinkel, -steigungswinkel, optimiert);
	}
}
